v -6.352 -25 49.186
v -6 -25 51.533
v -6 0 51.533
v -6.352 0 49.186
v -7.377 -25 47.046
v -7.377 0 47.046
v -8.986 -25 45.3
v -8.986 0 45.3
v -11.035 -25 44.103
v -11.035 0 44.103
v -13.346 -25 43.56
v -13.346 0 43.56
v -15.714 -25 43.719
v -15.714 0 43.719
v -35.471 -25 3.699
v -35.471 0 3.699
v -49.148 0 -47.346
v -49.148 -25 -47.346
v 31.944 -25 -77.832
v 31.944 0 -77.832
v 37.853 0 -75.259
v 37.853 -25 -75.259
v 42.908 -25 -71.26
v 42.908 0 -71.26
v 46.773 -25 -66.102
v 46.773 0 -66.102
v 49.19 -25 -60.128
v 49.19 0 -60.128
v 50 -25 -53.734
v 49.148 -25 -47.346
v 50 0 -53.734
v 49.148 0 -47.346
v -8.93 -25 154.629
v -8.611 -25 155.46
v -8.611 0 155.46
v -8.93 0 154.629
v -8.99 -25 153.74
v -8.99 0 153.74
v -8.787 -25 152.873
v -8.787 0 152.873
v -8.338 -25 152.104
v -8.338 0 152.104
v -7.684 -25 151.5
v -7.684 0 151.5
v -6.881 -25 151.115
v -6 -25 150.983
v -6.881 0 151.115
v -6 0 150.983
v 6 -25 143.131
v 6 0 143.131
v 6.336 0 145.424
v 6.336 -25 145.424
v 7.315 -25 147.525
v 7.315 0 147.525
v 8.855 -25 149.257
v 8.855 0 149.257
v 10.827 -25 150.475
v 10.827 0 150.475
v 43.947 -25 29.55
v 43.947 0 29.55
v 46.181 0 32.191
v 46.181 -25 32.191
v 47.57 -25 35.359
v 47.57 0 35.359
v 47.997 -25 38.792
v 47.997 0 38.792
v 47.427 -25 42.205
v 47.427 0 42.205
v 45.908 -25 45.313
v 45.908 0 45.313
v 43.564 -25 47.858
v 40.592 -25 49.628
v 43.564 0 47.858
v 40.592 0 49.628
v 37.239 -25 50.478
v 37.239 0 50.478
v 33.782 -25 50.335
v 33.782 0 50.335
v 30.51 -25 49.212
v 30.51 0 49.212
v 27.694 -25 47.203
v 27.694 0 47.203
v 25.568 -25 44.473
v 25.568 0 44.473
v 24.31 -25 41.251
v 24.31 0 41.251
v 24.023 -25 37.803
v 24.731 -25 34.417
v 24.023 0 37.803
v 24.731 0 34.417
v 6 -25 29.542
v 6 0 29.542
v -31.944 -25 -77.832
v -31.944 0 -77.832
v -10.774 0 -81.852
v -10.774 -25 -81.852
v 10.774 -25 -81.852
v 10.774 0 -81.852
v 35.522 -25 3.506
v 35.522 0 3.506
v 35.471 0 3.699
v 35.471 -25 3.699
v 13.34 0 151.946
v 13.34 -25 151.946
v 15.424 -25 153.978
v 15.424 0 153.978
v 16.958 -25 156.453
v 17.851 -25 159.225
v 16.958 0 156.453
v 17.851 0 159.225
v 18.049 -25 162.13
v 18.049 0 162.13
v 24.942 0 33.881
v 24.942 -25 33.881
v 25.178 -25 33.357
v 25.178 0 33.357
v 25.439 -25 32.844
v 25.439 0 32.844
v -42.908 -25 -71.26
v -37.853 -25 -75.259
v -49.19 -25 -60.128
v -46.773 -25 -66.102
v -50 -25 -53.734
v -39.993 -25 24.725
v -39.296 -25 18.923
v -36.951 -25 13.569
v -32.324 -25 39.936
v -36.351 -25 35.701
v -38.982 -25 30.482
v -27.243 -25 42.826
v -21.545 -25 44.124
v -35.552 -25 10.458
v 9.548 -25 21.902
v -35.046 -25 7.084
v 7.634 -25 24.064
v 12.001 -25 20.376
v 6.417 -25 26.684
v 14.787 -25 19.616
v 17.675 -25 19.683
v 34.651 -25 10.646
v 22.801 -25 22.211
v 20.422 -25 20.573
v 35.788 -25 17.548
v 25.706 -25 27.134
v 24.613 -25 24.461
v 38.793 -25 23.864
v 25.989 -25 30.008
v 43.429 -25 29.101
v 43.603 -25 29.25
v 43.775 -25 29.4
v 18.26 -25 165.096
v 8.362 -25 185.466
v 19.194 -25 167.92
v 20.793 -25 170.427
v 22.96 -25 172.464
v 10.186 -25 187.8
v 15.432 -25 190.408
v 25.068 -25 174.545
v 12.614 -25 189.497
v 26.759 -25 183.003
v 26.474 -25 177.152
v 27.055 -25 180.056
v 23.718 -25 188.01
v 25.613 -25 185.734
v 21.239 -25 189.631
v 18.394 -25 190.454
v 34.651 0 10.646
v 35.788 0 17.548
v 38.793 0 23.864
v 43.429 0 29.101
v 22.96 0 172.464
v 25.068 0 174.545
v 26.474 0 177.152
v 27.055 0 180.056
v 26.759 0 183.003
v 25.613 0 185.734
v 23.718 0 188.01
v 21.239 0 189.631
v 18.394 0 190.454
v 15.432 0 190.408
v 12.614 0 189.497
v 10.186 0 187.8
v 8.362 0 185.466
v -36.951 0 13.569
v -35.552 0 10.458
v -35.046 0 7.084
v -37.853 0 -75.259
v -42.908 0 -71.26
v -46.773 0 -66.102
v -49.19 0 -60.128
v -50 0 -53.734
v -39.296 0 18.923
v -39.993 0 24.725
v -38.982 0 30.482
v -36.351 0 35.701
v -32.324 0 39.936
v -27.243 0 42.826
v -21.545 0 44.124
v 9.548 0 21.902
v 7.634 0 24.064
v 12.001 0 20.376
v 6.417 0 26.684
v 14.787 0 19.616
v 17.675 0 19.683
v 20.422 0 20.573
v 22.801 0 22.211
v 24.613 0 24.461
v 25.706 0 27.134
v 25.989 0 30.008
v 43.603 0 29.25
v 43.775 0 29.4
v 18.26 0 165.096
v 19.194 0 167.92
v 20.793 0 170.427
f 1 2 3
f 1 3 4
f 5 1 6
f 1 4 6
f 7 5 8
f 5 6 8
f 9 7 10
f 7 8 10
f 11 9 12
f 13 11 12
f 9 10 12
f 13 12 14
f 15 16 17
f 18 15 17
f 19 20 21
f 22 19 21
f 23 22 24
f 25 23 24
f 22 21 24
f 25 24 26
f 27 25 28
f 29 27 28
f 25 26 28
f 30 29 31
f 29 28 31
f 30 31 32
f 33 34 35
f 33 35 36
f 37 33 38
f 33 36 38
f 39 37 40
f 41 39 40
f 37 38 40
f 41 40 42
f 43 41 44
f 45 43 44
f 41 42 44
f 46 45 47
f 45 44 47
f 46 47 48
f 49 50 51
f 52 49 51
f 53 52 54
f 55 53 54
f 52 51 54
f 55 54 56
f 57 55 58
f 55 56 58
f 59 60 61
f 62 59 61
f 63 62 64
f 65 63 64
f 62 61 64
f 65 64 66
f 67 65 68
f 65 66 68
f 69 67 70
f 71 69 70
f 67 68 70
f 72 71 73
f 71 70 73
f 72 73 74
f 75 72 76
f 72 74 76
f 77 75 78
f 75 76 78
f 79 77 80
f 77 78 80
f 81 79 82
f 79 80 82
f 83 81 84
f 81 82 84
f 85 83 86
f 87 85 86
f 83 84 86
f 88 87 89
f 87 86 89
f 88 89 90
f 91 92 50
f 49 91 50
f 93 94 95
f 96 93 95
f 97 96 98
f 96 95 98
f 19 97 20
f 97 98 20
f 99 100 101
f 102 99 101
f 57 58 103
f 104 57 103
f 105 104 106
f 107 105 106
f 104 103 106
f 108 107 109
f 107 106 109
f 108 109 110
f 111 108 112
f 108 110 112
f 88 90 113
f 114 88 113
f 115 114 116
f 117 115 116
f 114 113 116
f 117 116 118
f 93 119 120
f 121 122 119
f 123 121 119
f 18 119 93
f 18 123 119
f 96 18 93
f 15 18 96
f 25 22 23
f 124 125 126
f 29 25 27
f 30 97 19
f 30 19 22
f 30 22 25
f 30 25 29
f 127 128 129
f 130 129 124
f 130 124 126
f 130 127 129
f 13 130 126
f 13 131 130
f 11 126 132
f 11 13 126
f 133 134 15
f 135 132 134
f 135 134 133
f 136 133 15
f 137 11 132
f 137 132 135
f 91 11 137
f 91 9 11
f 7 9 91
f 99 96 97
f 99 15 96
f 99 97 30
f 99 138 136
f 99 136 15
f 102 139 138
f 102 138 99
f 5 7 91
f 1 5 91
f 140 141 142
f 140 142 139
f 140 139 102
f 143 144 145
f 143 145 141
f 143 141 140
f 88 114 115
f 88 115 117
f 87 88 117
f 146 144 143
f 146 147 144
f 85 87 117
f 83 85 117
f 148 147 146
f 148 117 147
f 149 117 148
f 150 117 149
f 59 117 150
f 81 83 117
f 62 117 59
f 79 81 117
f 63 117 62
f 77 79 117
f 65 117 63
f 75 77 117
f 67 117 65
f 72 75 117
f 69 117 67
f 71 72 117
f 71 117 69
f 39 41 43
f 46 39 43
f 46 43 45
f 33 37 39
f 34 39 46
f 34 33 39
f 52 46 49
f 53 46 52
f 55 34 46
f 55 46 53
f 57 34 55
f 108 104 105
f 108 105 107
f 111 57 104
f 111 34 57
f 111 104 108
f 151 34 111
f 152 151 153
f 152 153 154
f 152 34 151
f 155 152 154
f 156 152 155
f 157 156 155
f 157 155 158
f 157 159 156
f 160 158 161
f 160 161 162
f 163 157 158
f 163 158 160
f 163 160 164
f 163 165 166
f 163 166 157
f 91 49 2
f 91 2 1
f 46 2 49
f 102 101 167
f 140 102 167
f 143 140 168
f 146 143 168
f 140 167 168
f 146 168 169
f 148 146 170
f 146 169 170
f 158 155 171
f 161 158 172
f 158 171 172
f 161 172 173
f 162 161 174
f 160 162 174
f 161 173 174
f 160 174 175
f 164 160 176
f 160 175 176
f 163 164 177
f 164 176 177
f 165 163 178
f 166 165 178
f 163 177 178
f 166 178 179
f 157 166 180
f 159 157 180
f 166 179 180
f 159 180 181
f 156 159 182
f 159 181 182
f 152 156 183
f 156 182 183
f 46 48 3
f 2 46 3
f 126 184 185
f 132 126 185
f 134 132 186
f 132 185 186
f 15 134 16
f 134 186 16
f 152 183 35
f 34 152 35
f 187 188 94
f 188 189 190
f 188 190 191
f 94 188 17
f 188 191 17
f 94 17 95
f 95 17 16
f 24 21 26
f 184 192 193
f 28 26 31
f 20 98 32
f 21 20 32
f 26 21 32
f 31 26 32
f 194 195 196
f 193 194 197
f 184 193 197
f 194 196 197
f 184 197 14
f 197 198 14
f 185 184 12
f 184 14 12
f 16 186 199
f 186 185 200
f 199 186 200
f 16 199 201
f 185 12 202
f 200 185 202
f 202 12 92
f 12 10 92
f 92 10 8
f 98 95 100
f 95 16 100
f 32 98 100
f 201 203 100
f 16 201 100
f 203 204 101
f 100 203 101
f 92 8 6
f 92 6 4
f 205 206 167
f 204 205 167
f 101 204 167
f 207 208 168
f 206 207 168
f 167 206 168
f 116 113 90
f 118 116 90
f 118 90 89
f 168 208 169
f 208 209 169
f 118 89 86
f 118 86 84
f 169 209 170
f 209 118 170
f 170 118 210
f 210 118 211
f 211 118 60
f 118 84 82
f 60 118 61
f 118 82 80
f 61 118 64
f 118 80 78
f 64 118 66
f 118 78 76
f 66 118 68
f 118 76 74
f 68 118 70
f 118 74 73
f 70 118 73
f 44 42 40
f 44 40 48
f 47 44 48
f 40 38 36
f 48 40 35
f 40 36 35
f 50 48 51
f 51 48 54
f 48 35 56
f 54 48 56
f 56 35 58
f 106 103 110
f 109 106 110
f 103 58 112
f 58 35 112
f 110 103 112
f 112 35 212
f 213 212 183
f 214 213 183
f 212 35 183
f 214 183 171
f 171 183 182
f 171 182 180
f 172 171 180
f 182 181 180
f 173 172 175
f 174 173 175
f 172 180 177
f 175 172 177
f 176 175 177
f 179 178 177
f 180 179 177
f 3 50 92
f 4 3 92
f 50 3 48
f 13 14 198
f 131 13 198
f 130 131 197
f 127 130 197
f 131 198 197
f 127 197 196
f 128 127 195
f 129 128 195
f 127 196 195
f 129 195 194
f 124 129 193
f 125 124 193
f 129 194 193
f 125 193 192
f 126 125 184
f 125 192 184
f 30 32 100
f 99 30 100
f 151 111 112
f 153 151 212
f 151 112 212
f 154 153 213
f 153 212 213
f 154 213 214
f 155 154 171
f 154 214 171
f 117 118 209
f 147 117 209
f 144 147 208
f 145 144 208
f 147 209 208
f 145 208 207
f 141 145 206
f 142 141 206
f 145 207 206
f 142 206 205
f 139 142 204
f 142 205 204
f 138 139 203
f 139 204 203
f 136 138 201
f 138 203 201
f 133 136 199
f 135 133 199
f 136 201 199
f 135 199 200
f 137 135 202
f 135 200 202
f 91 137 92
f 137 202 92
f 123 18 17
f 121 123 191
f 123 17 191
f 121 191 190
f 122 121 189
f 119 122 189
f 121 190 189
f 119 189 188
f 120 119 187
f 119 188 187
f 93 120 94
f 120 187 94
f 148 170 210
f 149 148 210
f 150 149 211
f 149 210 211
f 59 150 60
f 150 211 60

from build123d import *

# Parameters (mm, degrees)
F1_DEPTH = 25


with BuildPart() as f1:
    # F0 (on Front) → F1 (new body)
    with BuildSketch(Plane.XZ):
        with BuildLine():
            Line((-35.470672, 3.699372), (-49.148146, -47.345653))
            ThreePointArc((-49.148146, -47.345653), (-46.772589, -66.102477), (-31.944444, -77.832263))
            ThreePointArc((-31.944444, -77.832263), (0, -82.358046), (31.944444, -77.832263))
            ThreePointArc((31.944444, -77.832263), (46.772589, -66.102477), (49.148146, -47.345653))
            Line((49.148146, -47.345653), (35.522421, 3.506244))
            ThreePointArc((35.522421, 3.506244), (35.496354, 3.602756), (35.470672, 3.699372))
            ThreePointArc((35.470672, 3.699372), (35.788024, 17.547763), (43.429453, 29.101429))
            ThreePointArc((43.429453, 29.101429), (43.688987, 29.324619), (43.946501, 29.550138))
            ThreePointArc((43.946501, 29.550138), (38.94623, 50.174676), (24.731334, 34.416789))
            ThreePointArc((24.731334, 34.416789), (25.119215, 33.645622), (25.439145, 32.843876))
            ThreePointArc((25.439145, 32.843876), (17.674598, 19.683186), (6, 29.541975))
            Line((6, 29.541975), (6, 143.131175))
            ThreePointArc((6, 143.131175), (7.314658, 147.525057), (10.826549, 150.474826))
            ThreePointArc((10.826549, 150.474826), (16.266553, 155.169201), (18.049311, 162.12999))
            ThreePointArc((18.049311, 162.12999), (19.193699, 167.920002), (22.959953, 172.464142))
            ThreePointArc((22.959953, 172.464142), (23.717633, 188.010173), (8.362425, 185.466407))
            Line((8.362425, 185.466407), (-8.611184, 155.4601))
            ThreePointArc((-8.611184, 155.4601), (-8.591447, 152.471612), (-6, 150.983036))
            Line((-6, 150.983036), (-6, 51.53346))
            ThreePointArc((-6, 51.53346), (-8.985735, 45.29991), (-15.714286, 43.719292))
            ThreePointArc((-15.714286, 43.719292), (-36.351172, 35.70078), (-36.950613, 13.568941))
            ThreePointArc((-36.950613, 13.568941), (-35.18295, 8.788259), (-35.470672, 3.699372))
        make_face()
        with BuildLine():
            ThreePointArc((35.470672, 3.699372), (35.496354, 3.602756), (35.522421, 3.506244))
            Line((35.522421, 3.506244), (35.470672, 3.699372))
        make_face()
        with BuildLine():
            ThreePointArc((25.439145, 32.843876), (25.119215, 33.645622), (24.731334, 34.416789))
            ThreePointArc((24.731334, 34.416789), (25.056942, 33.617599), (25.439145, 32.843876))
        make_face()
    extrude(amount=F1_DEPTH)


solid = f1.part
